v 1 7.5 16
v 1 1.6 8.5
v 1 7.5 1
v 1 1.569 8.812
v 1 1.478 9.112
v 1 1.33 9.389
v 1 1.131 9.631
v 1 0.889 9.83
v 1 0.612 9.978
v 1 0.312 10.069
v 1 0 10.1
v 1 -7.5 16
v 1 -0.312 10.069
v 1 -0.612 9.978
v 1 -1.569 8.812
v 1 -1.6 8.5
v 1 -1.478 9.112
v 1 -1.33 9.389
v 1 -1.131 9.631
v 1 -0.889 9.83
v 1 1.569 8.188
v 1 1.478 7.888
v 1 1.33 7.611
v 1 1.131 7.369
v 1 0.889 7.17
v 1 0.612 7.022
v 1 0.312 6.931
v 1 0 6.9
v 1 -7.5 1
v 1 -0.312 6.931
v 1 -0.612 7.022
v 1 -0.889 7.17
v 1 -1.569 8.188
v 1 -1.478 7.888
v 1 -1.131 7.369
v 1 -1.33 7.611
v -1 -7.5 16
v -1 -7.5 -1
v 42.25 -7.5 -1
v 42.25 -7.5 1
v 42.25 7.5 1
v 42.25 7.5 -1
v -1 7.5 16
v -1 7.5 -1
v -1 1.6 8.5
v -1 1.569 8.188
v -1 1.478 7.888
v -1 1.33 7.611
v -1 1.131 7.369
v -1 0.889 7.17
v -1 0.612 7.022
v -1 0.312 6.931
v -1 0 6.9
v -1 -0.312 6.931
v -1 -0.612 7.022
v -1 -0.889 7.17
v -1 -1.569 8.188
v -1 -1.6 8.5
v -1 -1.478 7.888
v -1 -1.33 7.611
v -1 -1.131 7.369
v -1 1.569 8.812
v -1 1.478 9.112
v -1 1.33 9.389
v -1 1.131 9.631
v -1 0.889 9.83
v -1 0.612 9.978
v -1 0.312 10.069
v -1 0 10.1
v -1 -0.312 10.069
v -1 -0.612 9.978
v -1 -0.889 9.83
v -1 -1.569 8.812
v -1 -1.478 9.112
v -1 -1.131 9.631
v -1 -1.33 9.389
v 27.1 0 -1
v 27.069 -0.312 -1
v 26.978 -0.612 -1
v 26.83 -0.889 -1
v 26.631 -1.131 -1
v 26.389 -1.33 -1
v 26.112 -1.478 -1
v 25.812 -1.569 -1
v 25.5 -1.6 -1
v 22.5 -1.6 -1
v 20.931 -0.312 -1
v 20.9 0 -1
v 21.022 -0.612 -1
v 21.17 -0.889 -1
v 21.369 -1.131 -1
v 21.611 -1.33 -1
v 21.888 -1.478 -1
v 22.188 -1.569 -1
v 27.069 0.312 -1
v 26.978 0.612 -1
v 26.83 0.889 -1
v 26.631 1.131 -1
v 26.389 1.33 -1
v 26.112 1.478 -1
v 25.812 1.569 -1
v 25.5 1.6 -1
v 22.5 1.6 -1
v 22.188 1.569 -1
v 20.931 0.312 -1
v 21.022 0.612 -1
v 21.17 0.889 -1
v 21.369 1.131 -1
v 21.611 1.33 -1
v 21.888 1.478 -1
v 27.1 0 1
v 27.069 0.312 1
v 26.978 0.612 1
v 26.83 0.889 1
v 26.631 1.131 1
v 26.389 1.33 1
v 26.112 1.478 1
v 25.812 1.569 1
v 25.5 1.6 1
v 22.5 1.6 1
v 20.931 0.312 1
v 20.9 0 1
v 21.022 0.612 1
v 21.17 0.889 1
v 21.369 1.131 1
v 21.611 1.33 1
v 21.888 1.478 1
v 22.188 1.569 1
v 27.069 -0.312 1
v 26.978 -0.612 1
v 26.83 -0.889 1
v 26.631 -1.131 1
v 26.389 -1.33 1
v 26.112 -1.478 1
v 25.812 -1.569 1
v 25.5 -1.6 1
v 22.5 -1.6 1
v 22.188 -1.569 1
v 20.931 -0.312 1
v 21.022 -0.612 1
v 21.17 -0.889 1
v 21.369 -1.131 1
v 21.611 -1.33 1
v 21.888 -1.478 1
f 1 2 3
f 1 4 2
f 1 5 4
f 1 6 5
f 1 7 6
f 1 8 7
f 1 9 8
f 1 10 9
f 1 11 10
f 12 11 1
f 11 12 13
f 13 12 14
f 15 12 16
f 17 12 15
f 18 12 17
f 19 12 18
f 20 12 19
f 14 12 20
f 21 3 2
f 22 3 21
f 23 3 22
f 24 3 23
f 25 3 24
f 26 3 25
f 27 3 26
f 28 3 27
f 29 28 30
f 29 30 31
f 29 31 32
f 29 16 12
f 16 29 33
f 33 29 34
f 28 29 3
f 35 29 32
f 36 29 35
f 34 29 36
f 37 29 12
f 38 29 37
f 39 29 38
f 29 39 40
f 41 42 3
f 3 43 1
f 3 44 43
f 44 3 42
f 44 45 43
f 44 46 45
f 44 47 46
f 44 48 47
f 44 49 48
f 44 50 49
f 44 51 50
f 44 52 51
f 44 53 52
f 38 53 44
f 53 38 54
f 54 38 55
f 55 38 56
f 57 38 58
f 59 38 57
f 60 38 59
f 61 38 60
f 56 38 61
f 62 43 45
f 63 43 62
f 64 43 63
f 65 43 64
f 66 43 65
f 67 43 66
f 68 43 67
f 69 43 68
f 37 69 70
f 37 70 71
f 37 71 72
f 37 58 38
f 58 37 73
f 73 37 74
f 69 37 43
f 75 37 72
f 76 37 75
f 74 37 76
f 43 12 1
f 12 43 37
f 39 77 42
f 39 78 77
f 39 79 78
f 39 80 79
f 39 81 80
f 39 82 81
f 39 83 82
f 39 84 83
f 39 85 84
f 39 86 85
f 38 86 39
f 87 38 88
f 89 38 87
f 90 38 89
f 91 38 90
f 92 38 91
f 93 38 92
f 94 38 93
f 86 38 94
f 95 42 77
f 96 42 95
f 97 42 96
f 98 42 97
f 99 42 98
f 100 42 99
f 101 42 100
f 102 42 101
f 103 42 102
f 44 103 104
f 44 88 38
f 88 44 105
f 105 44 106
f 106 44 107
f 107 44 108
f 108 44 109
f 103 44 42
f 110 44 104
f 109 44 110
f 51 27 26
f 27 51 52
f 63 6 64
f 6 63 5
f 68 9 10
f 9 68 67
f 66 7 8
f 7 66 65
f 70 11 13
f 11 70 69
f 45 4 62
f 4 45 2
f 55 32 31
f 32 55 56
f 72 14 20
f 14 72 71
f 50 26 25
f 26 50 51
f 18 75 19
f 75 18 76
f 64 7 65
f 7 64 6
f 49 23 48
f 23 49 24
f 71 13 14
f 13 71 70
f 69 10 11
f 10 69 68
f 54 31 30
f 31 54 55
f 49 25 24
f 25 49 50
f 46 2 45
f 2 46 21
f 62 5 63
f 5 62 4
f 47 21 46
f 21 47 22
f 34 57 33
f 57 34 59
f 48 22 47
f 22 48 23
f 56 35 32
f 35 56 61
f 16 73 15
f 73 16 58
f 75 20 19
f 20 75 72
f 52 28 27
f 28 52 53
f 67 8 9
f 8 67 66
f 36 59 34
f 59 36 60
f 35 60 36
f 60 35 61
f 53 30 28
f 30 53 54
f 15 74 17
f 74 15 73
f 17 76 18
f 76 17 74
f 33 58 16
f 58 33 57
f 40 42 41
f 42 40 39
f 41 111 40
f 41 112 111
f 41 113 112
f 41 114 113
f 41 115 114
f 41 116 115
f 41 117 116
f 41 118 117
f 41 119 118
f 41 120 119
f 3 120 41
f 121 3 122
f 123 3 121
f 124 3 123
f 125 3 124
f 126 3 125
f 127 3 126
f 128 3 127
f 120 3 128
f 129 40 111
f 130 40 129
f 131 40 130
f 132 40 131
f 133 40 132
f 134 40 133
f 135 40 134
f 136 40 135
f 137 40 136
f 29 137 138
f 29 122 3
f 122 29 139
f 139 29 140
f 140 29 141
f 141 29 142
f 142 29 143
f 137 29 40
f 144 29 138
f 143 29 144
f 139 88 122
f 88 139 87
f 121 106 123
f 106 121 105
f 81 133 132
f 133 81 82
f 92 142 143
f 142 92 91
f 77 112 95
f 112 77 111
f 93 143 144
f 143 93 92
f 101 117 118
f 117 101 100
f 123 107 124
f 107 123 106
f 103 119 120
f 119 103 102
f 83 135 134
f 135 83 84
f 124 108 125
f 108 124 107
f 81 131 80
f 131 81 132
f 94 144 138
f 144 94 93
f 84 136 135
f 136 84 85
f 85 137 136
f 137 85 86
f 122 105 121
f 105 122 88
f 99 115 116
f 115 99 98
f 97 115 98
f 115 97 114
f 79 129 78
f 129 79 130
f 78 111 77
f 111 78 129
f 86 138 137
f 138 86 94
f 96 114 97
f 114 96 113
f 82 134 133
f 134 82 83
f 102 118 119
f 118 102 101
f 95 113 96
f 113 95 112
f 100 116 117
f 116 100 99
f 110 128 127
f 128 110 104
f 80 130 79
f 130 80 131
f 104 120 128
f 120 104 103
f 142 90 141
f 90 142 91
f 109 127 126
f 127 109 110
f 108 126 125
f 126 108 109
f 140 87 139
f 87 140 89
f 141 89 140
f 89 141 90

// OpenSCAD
cutting_epsilon = 0.05;

module arduino_holder_bracket(beam_width = 15,
		hole_diameter = 3,
		thickness = 2,
		epsilon = 0.1) {
	rotate([90, 0, 0])
		union() {
			bracket_height = 2.75*beam_width;
			chd = hole_diameter + 2*epsilon;
			translate([0, beam_width/2, 0])
				difference() {
					cube([thickness, beam_width + thickness, beam_width],
						center = true);

					translate([0, thickness/2, 0])
						rotate([0, 90, 0])
							cylinder(d = chd, h = thickness + cutting_epsilon,
								center = true,
								$fn = 32);
				}

			translate([bracket_height/2, 0, 0])
				difference() {
					cube([bracket_height + thickness, thickness, beam_width],
						center = true);
					translate([thickness/2 + 0.125*beam_width, 0, 0])
						rotate([90, 0, 0])
							hull()
								for (f = [-1, 1, 2])
									translate([f, 0, 0])
										cylinder(d = chd, h = thickness + cutting_epsilon,
											center = true,
											$fn = 32);
				}
		}
}

arduino_holder_bracket();
